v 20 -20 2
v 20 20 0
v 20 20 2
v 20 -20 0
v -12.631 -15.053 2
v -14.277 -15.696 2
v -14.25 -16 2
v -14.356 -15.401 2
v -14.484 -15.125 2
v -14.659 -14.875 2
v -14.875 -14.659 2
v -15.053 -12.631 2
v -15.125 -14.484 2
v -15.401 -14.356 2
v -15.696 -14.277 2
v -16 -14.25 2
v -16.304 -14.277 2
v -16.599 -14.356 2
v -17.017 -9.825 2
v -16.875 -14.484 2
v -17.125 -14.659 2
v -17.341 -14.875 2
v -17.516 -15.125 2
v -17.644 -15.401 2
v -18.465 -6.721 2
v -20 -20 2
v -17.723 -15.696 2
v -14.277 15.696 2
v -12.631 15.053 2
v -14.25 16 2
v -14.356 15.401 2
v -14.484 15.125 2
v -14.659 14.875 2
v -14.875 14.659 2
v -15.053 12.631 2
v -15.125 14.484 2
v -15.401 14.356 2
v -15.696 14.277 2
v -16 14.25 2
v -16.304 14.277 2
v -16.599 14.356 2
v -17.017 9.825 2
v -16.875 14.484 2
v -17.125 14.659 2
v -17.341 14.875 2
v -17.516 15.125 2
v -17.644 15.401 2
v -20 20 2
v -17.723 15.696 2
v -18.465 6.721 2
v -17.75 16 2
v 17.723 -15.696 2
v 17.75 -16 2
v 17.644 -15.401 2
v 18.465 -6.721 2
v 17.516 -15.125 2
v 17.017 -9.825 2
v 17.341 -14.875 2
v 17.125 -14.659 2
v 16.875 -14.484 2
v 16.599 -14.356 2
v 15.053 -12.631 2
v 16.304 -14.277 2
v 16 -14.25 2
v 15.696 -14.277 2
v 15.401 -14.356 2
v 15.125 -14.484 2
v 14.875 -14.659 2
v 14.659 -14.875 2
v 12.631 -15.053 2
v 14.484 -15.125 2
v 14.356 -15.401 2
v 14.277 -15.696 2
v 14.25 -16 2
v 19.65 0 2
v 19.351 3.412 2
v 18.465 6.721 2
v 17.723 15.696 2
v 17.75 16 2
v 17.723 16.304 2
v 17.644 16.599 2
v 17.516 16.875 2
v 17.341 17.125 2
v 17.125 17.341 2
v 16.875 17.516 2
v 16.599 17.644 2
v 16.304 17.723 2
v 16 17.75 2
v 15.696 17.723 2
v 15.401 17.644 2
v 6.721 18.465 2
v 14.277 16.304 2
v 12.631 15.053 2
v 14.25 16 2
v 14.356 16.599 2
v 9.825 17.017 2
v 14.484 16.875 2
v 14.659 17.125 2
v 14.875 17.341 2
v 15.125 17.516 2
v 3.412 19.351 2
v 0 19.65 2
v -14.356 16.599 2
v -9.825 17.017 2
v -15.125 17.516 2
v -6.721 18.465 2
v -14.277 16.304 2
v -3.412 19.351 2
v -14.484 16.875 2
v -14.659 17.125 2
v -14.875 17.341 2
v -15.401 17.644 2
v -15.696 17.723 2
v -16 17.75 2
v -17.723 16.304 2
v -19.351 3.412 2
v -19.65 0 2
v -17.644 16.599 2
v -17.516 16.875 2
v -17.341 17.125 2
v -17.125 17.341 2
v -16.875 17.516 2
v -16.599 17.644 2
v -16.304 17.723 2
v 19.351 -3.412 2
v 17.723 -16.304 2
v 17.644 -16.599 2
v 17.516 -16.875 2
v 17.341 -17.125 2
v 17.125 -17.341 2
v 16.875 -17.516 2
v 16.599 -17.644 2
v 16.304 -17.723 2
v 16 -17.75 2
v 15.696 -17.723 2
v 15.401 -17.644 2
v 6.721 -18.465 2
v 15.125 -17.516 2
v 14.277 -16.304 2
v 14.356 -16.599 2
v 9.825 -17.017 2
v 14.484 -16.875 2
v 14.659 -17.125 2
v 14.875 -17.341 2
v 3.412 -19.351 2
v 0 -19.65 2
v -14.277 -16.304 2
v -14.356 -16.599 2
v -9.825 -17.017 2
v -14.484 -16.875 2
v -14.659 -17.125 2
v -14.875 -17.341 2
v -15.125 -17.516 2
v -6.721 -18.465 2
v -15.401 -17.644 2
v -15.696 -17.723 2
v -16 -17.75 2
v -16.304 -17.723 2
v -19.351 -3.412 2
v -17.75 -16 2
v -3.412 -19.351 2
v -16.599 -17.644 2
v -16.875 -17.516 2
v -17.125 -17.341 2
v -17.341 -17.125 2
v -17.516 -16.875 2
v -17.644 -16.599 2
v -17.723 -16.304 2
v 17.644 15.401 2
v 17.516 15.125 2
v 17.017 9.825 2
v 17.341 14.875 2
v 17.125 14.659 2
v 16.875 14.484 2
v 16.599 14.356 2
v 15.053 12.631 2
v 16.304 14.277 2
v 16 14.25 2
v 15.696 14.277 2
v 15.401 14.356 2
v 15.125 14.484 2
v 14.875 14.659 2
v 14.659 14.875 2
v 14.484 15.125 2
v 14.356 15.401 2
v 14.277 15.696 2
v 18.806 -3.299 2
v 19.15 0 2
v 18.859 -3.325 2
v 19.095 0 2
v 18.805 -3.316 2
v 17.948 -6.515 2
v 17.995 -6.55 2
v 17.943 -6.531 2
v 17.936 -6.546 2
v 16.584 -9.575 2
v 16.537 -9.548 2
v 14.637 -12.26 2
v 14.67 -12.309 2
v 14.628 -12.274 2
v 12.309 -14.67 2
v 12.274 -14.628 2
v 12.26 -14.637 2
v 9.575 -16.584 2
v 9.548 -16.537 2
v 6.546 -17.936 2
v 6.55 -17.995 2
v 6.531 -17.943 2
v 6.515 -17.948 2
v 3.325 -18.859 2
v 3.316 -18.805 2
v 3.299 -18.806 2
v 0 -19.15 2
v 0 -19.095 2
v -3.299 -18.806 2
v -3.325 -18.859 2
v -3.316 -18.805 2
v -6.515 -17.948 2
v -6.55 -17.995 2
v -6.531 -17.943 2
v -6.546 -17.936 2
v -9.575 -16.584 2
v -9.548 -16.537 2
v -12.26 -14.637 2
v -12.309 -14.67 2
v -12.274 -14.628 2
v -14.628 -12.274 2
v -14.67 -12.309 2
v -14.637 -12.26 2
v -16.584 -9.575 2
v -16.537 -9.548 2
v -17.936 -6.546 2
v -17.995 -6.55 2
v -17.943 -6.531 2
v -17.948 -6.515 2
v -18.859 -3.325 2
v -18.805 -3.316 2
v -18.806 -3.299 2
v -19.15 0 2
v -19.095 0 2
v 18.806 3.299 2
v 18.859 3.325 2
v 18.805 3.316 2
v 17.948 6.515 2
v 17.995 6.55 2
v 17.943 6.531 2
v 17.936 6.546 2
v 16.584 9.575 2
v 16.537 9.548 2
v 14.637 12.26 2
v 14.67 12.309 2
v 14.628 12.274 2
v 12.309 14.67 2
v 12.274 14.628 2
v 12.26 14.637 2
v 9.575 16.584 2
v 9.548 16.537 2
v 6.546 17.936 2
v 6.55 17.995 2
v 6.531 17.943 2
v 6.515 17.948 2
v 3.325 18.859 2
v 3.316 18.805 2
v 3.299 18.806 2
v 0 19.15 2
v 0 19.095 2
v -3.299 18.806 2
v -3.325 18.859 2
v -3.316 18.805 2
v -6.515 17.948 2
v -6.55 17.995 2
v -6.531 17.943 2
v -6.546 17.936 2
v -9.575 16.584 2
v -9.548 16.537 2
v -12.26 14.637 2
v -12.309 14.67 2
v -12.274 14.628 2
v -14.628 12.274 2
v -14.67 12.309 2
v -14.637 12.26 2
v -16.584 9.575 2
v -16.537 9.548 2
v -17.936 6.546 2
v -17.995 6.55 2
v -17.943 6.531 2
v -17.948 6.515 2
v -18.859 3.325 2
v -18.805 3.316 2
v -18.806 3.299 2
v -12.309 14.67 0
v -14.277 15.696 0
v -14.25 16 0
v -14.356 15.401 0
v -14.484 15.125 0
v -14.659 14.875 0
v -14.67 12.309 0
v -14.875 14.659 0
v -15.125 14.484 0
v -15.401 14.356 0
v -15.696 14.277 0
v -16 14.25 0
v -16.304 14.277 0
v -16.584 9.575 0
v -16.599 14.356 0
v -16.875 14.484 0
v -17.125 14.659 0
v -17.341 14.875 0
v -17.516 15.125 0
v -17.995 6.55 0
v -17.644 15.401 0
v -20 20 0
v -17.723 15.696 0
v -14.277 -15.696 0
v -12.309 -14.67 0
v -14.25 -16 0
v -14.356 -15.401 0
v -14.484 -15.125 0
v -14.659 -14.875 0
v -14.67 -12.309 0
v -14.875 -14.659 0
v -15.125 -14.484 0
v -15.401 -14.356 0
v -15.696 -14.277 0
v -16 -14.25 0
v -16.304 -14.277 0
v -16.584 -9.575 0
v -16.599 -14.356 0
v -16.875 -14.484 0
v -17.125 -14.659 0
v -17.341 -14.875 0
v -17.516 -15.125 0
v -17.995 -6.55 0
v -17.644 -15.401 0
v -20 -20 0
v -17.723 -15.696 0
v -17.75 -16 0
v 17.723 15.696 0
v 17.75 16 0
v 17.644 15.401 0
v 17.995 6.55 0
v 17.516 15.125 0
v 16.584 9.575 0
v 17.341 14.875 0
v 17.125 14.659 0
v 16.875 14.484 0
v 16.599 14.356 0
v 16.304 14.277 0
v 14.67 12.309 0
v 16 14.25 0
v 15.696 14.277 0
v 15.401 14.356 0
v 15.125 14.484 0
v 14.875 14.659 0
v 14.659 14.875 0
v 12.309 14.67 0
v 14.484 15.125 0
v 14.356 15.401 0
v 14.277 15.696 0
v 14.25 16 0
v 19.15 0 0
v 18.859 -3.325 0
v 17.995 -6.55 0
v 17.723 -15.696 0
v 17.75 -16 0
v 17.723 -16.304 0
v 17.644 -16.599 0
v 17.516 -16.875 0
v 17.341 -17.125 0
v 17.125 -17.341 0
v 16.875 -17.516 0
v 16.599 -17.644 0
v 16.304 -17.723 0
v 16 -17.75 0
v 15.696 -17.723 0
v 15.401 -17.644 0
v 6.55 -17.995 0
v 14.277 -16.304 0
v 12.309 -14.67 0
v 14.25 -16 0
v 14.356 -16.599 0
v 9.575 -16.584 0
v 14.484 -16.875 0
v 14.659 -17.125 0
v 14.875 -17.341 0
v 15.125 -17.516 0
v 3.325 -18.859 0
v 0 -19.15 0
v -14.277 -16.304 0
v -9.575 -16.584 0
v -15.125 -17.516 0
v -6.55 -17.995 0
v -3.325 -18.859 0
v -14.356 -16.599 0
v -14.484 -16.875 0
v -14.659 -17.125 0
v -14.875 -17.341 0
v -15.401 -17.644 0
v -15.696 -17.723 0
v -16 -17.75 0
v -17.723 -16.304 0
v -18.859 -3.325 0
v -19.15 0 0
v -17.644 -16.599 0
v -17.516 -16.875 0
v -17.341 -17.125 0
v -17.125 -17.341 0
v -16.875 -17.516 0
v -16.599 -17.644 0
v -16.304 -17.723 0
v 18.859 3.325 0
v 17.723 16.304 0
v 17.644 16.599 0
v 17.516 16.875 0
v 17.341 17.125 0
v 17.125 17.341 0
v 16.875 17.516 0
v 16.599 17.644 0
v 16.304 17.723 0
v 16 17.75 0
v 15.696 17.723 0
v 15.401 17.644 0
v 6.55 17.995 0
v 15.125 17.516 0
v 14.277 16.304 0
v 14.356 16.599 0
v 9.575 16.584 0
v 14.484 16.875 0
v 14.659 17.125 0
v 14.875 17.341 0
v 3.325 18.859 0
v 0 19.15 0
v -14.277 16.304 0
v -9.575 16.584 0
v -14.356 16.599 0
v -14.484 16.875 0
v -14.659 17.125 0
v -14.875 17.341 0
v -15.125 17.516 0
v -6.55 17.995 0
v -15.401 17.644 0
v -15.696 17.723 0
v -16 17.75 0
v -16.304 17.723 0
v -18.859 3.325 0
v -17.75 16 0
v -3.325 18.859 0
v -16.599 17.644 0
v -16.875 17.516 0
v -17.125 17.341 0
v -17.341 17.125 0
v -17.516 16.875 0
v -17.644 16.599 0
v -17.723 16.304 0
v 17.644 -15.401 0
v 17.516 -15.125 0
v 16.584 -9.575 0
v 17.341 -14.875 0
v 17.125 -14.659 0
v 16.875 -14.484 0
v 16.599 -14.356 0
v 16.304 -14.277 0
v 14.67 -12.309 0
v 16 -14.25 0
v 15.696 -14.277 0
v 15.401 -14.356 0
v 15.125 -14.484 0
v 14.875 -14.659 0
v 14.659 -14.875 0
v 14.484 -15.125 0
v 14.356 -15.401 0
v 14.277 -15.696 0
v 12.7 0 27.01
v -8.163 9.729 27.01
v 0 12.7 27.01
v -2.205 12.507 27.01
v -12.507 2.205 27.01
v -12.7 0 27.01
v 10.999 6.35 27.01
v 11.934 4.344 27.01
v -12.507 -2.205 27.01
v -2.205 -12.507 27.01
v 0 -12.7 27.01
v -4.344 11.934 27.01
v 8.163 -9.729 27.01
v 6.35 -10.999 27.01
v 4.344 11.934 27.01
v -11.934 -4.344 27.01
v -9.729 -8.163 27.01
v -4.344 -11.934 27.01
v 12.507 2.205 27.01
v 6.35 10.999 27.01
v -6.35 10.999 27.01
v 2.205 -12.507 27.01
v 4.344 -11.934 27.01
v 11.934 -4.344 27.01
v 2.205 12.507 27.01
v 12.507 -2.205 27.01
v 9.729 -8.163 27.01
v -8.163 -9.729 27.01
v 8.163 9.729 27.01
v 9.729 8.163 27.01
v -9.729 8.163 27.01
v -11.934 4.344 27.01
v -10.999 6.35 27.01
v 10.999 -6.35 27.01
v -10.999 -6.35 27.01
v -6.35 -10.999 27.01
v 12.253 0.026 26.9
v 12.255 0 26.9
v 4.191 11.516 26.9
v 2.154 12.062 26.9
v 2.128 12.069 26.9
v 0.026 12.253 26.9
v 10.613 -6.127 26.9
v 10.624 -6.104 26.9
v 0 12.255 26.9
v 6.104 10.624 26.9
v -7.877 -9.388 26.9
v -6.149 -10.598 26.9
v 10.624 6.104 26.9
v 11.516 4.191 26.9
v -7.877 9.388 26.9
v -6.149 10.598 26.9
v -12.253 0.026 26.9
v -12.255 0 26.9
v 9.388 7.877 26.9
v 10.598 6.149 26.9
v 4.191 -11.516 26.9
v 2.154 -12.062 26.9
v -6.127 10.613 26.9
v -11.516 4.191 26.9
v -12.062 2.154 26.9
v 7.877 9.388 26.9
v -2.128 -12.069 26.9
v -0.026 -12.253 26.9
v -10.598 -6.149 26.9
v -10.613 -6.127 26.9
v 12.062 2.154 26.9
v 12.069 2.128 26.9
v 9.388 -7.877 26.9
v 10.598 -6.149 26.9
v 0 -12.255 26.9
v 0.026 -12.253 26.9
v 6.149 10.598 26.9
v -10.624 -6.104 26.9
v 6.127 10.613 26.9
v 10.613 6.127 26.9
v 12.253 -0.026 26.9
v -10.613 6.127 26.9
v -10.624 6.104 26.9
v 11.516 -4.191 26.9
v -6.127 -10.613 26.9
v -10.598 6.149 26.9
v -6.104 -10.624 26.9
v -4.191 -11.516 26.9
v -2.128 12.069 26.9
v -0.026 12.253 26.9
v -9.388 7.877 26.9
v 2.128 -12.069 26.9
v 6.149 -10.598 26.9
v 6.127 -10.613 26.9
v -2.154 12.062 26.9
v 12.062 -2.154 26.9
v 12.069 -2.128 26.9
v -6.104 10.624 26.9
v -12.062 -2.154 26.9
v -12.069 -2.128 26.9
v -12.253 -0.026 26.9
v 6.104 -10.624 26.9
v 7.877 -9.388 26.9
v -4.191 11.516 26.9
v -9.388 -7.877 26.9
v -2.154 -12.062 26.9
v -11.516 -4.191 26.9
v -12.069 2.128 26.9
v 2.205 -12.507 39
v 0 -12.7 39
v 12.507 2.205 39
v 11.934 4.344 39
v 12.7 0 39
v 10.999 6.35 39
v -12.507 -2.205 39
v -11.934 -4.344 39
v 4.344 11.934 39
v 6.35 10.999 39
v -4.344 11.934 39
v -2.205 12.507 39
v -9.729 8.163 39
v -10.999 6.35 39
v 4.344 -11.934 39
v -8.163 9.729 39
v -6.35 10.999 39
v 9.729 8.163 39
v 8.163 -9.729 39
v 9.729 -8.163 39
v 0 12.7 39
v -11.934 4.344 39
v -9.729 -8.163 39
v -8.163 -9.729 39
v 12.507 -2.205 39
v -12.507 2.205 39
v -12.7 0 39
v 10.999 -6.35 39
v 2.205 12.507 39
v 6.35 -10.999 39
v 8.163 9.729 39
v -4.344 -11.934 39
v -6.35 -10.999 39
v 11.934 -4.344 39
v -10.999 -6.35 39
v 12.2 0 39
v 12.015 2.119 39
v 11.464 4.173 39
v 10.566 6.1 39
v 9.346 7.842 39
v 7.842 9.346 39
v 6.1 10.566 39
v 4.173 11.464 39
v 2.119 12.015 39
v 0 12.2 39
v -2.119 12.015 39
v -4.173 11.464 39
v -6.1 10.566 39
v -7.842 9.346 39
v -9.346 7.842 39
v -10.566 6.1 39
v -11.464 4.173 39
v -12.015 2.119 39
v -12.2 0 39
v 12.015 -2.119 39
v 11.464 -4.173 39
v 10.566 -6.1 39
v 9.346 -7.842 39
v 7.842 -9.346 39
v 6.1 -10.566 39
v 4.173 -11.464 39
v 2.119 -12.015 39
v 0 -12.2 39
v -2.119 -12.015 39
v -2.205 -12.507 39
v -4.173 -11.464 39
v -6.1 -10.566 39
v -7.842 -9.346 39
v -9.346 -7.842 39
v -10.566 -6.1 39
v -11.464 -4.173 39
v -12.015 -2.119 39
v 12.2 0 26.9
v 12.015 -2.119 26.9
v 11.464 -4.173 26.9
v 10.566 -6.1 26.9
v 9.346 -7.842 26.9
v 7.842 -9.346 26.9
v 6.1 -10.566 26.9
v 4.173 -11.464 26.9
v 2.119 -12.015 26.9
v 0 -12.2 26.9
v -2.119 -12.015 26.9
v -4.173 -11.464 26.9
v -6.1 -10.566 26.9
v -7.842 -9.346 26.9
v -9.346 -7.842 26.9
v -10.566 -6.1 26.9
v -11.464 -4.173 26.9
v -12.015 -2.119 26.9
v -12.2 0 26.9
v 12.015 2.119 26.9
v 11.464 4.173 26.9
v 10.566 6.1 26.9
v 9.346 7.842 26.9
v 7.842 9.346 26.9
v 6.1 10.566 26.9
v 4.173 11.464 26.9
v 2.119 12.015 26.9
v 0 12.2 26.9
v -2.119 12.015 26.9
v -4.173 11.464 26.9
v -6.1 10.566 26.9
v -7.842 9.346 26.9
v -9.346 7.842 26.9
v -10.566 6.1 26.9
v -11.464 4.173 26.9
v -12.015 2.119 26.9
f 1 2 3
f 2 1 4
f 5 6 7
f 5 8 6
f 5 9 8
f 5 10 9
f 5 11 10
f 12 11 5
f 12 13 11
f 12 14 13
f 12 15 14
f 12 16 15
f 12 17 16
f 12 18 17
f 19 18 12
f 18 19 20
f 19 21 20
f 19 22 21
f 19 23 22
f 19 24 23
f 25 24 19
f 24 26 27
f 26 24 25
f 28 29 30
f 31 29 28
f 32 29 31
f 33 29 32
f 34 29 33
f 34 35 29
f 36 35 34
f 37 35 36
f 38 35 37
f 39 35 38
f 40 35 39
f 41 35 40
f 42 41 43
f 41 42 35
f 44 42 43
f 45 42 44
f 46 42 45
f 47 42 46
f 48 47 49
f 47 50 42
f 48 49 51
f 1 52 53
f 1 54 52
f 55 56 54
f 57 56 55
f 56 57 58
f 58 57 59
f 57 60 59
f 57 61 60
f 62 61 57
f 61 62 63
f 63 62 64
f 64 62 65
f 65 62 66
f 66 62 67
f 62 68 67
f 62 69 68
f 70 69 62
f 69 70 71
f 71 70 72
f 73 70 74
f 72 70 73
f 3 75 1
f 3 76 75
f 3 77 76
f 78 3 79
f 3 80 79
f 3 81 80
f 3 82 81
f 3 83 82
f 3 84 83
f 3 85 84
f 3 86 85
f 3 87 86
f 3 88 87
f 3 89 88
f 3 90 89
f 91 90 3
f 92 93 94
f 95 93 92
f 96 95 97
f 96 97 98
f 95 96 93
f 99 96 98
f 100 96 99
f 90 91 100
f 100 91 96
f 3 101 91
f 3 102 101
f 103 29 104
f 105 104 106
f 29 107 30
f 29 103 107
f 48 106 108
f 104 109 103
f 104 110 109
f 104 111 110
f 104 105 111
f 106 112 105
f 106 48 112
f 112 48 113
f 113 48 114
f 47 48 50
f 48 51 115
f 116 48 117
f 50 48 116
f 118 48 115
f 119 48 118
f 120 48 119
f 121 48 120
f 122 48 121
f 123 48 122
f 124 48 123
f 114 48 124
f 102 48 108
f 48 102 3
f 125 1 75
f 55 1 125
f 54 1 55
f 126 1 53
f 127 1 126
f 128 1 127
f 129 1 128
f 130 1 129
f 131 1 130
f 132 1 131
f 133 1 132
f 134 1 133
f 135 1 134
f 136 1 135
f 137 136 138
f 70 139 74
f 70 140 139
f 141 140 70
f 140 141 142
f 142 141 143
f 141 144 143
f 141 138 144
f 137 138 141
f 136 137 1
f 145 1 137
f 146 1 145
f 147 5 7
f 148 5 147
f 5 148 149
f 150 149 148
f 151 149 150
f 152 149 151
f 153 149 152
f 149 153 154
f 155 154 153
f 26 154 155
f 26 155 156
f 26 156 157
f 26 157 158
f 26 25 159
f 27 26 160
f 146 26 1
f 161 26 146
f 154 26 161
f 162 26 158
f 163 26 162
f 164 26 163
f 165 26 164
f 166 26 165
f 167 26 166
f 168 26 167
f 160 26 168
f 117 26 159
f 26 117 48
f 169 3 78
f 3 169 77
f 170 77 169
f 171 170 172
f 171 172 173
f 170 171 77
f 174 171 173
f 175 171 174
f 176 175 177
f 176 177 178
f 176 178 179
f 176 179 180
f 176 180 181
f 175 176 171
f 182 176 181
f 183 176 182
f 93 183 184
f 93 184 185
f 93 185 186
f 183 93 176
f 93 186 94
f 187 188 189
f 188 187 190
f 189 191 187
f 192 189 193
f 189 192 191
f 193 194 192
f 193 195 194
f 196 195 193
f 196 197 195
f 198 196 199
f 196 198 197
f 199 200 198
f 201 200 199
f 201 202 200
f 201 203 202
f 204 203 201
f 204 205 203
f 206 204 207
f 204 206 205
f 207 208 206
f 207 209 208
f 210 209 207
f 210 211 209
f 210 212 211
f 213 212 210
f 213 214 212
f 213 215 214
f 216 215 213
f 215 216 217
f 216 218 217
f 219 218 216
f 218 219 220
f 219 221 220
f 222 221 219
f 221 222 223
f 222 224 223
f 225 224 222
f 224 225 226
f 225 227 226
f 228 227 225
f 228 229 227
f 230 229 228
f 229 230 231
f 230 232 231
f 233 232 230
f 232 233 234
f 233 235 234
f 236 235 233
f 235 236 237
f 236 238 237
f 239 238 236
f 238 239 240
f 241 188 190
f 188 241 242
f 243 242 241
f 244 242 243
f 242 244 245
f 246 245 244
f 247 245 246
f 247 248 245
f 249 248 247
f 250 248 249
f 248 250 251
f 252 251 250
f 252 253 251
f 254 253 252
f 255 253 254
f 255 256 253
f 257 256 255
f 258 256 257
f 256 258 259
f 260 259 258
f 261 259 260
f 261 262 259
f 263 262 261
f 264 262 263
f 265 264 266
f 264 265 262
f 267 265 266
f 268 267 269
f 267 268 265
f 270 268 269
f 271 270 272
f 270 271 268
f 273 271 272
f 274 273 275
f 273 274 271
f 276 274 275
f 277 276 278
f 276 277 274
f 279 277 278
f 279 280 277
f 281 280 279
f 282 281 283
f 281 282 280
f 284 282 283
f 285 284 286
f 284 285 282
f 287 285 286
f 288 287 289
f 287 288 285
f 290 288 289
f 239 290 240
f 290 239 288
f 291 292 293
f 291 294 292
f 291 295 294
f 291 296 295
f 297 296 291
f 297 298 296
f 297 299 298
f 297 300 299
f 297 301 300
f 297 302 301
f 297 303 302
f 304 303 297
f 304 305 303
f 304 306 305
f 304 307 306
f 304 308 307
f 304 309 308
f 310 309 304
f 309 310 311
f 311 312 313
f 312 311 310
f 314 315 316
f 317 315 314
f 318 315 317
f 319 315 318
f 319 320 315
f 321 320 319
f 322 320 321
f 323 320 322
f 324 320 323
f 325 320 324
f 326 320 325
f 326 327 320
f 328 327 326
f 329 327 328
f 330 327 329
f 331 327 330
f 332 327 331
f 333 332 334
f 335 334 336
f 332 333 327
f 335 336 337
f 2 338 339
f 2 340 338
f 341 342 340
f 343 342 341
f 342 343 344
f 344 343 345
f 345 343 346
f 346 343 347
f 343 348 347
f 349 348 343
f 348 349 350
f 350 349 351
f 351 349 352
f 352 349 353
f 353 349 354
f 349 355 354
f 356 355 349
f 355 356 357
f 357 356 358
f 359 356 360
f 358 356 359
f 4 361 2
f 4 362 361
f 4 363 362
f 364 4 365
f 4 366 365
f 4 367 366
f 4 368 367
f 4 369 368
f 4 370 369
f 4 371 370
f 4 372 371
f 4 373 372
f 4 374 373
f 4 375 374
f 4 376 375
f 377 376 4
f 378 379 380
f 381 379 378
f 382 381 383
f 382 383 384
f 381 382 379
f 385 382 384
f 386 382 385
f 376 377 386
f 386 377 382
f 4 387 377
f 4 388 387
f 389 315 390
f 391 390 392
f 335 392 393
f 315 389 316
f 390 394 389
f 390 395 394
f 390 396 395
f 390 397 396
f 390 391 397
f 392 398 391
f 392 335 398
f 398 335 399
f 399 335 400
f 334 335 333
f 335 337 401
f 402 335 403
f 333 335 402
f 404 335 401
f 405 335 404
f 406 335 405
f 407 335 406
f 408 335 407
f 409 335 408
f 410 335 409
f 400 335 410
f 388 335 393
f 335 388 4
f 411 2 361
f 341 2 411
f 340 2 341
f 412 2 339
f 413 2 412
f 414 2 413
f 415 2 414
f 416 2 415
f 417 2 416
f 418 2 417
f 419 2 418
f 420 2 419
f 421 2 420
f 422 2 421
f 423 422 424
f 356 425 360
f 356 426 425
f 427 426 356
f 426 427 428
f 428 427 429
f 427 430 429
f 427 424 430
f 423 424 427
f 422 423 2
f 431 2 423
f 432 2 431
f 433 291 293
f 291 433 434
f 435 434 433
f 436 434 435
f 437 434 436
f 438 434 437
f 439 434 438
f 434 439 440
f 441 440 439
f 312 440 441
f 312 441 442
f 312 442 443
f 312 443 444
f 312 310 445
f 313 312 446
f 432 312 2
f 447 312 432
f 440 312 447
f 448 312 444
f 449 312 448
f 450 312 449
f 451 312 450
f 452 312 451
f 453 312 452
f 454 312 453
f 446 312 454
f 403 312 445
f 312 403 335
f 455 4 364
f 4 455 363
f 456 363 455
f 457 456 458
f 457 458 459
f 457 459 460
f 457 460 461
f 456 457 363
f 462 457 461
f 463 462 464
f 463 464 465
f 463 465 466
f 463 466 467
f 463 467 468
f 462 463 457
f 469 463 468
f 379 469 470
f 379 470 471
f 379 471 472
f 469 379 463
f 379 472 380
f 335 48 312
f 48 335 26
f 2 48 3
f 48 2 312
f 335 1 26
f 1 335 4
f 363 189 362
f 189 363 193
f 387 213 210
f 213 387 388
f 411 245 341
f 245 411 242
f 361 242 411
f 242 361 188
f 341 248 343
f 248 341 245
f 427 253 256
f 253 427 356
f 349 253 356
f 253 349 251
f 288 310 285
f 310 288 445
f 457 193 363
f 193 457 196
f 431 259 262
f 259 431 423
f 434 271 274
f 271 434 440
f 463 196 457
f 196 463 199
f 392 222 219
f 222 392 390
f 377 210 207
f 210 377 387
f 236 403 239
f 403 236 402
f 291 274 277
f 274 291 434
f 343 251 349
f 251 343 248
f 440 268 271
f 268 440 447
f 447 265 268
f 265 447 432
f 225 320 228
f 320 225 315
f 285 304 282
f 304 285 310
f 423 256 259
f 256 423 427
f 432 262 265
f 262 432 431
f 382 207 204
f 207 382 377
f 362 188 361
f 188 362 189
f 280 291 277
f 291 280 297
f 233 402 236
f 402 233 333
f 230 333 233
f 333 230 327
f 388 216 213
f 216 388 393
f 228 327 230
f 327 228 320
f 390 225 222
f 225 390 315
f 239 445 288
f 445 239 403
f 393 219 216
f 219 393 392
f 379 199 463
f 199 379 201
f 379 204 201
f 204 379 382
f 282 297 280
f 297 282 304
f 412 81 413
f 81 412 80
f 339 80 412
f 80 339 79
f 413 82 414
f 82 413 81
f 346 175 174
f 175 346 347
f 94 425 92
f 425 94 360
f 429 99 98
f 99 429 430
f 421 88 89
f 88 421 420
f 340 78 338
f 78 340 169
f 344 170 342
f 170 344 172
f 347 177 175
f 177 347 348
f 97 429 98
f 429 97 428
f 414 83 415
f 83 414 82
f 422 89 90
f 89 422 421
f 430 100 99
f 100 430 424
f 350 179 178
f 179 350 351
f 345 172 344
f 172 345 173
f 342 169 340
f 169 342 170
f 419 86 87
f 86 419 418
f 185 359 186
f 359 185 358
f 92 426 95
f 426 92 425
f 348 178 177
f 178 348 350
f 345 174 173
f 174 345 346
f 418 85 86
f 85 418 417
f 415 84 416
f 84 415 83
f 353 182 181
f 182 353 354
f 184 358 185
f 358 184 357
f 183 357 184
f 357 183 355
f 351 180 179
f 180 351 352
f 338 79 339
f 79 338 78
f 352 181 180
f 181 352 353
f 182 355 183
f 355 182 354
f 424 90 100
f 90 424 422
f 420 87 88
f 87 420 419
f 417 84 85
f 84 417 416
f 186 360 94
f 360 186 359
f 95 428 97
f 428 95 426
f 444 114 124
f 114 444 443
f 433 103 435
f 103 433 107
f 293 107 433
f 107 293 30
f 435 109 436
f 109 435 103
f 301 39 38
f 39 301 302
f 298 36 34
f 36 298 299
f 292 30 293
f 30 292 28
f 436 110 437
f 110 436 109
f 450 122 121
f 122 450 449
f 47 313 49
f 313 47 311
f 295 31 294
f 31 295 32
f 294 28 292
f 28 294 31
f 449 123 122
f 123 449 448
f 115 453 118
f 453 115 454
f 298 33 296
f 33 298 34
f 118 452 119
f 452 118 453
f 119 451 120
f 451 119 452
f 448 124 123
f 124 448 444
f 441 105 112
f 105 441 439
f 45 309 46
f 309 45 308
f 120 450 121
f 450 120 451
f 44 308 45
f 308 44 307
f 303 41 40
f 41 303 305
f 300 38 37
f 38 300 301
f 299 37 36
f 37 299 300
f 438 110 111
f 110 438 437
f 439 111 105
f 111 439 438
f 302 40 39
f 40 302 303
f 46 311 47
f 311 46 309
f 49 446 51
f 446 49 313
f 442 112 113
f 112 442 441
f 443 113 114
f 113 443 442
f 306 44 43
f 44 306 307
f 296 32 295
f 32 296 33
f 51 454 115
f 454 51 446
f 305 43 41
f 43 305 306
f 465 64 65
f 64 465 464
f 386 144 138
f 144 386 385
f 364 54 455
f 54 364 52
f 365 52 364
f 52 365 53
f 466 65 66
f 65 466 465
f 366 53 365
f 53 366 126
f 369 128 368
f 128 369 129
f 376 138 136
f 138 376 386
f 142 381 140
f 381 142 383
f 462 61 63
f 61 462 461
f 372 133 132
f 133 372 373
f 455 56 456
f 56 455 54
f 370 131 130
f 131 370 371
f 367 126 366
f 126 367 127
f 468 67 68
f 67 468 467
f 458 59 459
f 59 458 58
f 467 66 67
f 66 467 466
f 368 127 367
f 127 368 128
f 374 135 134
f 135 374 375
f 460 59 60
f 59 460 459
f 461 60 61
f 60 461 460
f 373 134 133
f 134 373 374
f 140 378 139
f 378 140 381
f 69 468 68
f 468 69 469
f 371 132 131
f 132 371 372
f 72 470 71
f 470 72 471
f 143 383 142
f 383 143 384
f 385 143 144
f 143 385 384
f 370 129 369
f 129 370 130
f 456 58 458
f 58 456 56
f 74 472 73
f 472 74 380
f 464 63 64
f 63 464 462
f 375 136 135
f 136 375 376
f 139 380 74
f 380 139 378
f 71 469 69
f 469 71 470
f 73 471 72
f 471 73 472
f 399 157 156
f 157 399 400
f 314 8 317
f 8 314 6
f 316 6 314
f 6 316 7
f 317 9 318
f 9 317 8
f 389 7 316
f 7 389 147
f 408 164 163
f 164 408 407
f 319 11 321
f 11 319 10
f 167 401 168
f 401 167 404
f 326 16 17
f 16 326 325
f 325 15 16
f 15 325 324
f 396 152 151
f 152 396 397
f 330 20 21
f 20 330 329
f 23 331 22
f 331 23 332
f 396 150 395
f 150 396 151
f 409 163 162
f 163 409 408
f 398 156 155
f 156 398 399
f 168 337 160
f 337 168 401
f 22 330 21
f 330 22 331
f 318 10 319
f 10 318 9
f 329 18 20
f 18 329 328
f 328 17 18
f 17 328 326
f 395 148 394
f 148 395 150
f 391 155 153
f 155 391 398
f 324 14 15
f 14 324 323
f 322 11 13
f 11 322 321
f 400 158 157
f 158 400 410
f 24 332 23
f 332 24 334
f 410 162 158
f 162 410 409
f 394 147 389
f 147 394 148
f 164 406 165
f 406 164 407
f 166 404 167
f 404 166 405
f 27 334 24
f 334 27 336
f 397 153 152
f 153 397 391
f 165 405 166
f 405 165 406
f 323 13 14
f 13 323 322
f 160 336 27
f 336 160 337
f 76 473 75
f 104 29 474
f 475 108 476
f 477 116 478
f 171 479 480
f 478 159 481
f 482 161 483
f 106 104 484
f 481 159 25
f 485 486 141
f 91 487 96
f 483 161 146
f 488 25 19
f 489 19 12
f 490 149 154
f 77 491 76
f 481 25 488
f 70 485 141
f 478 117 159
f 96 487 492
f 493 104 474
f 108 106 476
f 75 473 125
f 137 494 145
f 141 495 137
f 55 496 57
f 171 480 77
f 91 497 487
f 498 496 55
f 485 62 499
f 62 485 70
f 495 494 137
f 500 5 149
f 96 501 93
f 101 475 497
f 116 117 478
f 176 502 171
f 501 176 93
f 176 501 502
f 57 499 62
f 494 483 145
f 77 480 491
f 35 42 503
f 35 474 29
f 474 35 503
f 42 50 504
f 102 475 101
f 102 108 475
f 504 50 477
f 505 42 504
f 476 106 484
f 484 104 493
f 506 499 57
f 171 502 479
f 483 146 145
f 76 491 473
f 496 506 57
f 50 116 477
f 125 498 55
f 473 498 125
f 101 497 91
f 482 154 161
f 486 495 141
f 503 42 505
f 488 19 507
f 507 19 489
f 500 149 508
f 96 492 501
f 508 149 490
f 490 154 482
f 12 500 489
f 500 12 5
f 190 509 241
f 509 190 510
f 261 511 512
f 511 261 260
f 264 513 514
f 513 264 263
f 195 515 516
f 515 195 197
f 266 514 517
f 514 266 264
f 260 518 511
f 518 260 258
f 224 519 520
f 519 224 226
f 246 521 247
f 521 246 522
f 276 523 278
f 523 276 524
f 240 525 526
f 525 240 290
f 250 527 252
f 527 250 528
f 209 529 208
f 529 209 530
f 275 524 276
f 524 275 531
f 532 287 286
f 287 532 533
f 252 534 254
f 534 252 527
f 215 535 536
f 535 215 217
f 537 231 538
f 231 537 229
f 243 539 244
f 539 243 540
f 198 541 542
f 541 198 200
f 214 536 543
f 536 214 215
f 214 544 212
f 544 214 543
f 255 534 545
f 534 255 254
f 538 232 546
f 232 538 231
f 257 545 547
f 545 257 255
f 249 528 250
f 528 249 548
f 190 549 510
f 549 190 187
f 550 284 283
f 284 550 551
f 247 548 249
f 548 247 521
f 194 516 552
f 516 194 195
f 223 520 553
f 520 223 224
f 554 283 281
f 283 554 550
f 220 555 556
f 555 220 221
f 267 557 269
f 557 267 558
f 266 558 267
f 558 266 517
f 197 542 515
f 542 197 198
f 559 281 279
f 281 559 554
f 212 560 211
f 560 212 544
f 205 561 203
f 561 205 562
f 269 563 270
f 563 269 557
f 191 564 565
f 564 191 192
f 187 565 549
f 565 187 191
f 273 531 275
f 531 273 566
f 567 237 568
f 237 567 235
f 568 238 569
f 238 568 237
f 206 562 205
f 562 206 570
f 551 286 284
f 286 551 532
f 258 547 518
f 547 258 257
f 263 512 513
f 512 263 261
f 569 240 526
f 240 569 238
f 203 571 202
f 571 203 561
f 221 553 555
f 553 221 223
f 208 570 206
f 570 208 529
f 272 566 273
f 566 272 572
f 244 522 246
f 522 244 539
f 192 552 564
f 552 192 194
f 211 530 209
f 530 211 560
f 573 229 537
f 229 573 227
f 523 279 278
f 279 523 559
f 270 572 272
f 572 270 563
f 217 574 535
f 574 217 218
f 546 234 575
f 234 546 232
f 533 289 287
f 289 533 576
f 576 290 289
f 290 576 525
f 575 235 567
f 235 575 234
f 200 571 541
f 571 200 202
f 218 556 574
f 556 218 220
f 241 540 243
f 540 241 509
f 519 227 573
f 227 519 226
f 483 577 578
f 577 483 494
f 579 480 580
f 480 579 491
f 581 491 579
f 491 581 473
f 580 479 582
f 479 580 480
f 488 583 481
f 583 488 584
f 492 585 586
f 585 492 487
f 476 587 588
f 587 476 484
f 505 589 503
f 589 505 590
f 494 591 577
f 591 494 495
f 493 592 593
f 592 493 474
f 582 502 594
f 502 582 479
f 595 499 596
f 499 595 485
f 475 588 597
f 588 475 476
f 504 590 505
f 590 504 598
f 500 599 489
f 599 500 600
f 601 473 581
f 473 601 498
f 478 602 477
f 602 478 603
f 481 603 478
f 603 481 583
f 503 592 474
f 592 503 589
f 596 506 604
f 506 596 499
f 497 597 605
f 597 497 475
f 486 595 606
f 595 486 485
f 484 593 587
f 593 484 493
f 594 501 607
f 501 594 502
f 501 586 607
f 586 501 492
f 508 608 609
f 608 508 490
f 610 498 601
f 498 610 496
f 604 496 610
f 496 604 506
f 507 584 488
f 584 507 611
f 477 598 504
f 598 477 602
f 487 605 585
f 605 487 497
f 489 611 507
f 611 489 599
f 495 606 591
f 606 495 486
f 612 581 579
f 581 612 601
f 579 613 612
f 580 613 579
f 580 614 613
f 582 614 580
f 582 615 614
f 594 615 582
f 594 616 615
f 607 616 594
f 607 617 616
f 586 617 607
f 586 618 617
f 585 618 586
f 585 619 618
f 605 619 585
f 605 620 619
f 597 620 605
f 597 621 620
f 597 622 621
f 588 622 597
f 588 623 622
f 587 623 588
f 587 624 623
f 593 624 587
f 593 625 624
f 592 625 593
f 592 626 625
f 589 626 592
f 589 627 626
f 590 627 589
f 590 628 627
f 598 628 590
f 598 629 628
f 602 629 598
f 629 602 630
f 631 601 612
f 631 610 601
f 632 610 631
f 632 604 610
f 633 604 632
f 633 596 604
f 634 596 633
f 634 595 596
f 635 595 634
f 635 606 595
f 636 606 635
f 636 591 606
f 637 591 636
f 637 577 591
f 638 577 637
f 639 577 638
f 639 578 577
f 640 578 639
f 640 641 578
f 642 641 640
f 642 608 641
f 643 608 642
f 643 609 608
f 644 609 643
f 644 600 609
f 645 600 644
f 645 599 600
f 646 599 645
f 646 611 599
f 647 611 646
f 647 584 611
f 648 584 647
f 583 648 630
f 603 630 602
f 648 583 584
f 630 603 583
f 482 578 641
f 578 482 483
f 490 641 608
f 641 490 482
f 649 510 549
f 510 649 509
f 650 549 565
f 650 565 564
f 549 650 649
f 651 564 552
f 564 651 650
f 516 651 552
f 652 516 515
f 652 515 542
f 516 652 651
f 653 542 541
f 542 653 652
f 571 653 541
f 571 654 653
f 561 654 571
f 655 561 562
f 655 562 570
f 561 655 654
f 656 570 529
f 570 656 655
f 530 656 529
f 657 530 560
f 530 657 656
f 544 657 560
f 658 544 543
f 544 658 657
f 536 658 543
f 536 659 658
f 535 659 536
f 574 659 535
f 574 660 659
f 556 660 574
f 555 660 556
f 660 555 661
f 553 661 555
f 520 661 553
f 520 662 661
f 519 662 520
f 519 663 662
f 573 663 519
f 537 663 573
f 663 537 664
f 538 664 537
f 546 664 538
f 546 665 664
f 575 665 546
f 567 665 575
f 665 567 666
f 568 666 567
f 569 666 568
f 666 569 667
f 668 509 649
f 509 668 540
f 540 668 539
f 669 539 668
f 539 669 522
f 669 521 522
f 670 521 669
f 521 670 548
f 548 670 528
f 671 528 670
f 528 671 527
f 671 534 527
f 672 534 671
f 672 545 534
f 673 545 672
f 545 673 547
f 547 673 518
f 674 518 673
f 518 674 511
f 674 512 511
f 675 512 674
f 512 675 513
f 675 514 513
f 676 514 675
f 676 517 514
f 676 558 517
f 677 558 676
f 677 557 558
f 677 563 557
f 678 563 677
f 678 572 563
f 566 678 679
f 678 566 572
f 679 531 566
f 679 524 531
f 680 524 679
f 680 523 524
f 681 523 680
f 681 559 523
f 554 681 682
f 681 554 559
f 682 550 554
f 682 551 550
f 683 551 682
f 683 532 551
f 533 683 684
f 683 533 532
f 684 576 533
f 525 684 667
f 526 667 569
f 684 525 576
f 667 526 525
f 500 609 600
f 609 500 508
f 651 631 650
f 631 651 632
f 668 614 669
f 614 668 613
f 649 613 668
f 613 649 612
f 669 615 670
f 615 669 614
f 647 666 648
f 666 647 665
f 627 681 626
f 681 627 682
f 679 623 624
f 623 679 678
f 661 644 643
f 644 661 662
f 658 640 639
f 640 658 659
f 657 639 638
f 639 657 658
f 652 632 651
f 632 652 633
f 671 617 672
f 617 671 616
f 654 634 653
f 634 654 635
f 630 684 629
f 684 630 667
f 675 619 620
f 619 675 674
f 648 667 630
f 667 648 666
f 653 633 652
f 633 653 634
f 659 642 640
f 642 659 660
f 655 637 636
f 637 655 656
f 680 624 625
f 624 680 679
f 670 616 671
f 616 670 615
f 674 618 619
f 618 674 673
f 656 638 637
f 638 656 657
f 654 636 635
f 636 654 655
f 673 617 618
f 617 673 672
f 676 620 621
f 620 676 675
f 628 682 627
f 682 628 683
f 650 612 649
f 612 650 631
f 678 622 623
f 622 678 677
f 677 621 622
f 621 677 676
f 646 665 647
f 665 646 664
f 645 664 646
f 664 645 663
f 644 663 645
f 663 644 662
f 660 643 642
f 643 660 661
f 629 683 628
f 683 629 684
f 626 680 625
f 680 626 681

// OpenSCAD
/* [General] */
//Fan Size (Only 40mm and 60mm Supported)
fan_size=40;//[40,60] 
//Wall Thickness (.5mm print nozzle)
wall_thickness=1;//[.5,1,1.5] 
//Resolution (facets per circular/sperical primitive)
resolution=36;//[36:540] 

/* [Flange] */
//Flange Height in mm (z axis)
flange_height=2; 
//Screw hole diameter in mm
screw_hole_diameter=3.5;// [3:5] 

/* [Conical Section] */
//Conical section height in mm (from top of flange (z axis))
conical_section_height=25; 

/* [Tube Slip Connector] */
//Exhaust Tube Slip Connector Height in mm (from top of conical section (z axis))
tube_connection_height=12; 
//Slip connector exterior diameter in mm
tube_connection_ext_diameter=25.4; 

/* [Hidden] */
$fn=resolution;

if (fan_size==40){
    
flange_info =   [
                38.3,//inner hole
                16//screwhole spacing
                ];

adapter(flange_info,
        fan_size,
        flange_height,
        screw_hole_diameter,
        conical_section_height,
        tube_connection_height,
        tube_connection_ext_diameter);    
}
else{
    flange_info =   [
                57.8,//inner hole
                25//screwhole spacing
                ];

adapter(flange_info,
        fan_size,
        flange_height,
        screw_hole_diameter,
        conical_section_height,
        tube_connection_height,
        tube_connection_ext_diameter);    
}

    
module adapter  (  
                flange_info,
                fan_size,
                flange_height,
                screw_hole_diameter,
                conical_section_height,
                tube_connection_height,
                tube_connection_ext_diameter){
  difference(){
    translate ([-fan_size/2,-fan_size/2,0])
      cube([fan_size,fan_size,flange_height]);
    translate([0,0,-.1])cylinder(h=flange_height+.2,d=flange_info[0]);
    translate([flange_info[1],flange_info[1],-.1])
      cylinder(h=flange_height+.2,d=screw_hole_diameter);
    translate([-flange_info[1],flange_info[1],-.1])
      cylinder(h=flange_height+.2,d=screw_hole_diameter);
    translate([flange_info[1],-flange_info[1],-.1])
      cylinder(h=flange_height+.2,d=screw_hole_diameter);
    translate([-flange_info[1],-flange_info[1],-.1])
      cylinder(h=flange_height+.2,d=screw_hole_diameter);
  }
 
  difference(){
    translate([0,0,flange_height])
      cylinder( h=conical_section_height+.01,
                d1=flange_info[0]+1,
                d2=tube_connection_ext_diameter);
    translate([0,0,flange_height-.2])
      cylinder( h=conical_section_height+.3,
                d1=flange_info[0],
                d2=tube_connection_ext_diameter-wall_thickness);
 }
 
 difference(){
   translate([0,0,flange_height+conical_section_height-.1])
     cylinder(h=tube_connection_height+.1,d=tube_connection_ext_diameter);
   translate([0,0,flange_height+conical_section_height-.2])
     cylinder(  h=tube_connection_height+.3,
                d=tube_connection_ext_diameter-wall_thickness);     
 }  
}
